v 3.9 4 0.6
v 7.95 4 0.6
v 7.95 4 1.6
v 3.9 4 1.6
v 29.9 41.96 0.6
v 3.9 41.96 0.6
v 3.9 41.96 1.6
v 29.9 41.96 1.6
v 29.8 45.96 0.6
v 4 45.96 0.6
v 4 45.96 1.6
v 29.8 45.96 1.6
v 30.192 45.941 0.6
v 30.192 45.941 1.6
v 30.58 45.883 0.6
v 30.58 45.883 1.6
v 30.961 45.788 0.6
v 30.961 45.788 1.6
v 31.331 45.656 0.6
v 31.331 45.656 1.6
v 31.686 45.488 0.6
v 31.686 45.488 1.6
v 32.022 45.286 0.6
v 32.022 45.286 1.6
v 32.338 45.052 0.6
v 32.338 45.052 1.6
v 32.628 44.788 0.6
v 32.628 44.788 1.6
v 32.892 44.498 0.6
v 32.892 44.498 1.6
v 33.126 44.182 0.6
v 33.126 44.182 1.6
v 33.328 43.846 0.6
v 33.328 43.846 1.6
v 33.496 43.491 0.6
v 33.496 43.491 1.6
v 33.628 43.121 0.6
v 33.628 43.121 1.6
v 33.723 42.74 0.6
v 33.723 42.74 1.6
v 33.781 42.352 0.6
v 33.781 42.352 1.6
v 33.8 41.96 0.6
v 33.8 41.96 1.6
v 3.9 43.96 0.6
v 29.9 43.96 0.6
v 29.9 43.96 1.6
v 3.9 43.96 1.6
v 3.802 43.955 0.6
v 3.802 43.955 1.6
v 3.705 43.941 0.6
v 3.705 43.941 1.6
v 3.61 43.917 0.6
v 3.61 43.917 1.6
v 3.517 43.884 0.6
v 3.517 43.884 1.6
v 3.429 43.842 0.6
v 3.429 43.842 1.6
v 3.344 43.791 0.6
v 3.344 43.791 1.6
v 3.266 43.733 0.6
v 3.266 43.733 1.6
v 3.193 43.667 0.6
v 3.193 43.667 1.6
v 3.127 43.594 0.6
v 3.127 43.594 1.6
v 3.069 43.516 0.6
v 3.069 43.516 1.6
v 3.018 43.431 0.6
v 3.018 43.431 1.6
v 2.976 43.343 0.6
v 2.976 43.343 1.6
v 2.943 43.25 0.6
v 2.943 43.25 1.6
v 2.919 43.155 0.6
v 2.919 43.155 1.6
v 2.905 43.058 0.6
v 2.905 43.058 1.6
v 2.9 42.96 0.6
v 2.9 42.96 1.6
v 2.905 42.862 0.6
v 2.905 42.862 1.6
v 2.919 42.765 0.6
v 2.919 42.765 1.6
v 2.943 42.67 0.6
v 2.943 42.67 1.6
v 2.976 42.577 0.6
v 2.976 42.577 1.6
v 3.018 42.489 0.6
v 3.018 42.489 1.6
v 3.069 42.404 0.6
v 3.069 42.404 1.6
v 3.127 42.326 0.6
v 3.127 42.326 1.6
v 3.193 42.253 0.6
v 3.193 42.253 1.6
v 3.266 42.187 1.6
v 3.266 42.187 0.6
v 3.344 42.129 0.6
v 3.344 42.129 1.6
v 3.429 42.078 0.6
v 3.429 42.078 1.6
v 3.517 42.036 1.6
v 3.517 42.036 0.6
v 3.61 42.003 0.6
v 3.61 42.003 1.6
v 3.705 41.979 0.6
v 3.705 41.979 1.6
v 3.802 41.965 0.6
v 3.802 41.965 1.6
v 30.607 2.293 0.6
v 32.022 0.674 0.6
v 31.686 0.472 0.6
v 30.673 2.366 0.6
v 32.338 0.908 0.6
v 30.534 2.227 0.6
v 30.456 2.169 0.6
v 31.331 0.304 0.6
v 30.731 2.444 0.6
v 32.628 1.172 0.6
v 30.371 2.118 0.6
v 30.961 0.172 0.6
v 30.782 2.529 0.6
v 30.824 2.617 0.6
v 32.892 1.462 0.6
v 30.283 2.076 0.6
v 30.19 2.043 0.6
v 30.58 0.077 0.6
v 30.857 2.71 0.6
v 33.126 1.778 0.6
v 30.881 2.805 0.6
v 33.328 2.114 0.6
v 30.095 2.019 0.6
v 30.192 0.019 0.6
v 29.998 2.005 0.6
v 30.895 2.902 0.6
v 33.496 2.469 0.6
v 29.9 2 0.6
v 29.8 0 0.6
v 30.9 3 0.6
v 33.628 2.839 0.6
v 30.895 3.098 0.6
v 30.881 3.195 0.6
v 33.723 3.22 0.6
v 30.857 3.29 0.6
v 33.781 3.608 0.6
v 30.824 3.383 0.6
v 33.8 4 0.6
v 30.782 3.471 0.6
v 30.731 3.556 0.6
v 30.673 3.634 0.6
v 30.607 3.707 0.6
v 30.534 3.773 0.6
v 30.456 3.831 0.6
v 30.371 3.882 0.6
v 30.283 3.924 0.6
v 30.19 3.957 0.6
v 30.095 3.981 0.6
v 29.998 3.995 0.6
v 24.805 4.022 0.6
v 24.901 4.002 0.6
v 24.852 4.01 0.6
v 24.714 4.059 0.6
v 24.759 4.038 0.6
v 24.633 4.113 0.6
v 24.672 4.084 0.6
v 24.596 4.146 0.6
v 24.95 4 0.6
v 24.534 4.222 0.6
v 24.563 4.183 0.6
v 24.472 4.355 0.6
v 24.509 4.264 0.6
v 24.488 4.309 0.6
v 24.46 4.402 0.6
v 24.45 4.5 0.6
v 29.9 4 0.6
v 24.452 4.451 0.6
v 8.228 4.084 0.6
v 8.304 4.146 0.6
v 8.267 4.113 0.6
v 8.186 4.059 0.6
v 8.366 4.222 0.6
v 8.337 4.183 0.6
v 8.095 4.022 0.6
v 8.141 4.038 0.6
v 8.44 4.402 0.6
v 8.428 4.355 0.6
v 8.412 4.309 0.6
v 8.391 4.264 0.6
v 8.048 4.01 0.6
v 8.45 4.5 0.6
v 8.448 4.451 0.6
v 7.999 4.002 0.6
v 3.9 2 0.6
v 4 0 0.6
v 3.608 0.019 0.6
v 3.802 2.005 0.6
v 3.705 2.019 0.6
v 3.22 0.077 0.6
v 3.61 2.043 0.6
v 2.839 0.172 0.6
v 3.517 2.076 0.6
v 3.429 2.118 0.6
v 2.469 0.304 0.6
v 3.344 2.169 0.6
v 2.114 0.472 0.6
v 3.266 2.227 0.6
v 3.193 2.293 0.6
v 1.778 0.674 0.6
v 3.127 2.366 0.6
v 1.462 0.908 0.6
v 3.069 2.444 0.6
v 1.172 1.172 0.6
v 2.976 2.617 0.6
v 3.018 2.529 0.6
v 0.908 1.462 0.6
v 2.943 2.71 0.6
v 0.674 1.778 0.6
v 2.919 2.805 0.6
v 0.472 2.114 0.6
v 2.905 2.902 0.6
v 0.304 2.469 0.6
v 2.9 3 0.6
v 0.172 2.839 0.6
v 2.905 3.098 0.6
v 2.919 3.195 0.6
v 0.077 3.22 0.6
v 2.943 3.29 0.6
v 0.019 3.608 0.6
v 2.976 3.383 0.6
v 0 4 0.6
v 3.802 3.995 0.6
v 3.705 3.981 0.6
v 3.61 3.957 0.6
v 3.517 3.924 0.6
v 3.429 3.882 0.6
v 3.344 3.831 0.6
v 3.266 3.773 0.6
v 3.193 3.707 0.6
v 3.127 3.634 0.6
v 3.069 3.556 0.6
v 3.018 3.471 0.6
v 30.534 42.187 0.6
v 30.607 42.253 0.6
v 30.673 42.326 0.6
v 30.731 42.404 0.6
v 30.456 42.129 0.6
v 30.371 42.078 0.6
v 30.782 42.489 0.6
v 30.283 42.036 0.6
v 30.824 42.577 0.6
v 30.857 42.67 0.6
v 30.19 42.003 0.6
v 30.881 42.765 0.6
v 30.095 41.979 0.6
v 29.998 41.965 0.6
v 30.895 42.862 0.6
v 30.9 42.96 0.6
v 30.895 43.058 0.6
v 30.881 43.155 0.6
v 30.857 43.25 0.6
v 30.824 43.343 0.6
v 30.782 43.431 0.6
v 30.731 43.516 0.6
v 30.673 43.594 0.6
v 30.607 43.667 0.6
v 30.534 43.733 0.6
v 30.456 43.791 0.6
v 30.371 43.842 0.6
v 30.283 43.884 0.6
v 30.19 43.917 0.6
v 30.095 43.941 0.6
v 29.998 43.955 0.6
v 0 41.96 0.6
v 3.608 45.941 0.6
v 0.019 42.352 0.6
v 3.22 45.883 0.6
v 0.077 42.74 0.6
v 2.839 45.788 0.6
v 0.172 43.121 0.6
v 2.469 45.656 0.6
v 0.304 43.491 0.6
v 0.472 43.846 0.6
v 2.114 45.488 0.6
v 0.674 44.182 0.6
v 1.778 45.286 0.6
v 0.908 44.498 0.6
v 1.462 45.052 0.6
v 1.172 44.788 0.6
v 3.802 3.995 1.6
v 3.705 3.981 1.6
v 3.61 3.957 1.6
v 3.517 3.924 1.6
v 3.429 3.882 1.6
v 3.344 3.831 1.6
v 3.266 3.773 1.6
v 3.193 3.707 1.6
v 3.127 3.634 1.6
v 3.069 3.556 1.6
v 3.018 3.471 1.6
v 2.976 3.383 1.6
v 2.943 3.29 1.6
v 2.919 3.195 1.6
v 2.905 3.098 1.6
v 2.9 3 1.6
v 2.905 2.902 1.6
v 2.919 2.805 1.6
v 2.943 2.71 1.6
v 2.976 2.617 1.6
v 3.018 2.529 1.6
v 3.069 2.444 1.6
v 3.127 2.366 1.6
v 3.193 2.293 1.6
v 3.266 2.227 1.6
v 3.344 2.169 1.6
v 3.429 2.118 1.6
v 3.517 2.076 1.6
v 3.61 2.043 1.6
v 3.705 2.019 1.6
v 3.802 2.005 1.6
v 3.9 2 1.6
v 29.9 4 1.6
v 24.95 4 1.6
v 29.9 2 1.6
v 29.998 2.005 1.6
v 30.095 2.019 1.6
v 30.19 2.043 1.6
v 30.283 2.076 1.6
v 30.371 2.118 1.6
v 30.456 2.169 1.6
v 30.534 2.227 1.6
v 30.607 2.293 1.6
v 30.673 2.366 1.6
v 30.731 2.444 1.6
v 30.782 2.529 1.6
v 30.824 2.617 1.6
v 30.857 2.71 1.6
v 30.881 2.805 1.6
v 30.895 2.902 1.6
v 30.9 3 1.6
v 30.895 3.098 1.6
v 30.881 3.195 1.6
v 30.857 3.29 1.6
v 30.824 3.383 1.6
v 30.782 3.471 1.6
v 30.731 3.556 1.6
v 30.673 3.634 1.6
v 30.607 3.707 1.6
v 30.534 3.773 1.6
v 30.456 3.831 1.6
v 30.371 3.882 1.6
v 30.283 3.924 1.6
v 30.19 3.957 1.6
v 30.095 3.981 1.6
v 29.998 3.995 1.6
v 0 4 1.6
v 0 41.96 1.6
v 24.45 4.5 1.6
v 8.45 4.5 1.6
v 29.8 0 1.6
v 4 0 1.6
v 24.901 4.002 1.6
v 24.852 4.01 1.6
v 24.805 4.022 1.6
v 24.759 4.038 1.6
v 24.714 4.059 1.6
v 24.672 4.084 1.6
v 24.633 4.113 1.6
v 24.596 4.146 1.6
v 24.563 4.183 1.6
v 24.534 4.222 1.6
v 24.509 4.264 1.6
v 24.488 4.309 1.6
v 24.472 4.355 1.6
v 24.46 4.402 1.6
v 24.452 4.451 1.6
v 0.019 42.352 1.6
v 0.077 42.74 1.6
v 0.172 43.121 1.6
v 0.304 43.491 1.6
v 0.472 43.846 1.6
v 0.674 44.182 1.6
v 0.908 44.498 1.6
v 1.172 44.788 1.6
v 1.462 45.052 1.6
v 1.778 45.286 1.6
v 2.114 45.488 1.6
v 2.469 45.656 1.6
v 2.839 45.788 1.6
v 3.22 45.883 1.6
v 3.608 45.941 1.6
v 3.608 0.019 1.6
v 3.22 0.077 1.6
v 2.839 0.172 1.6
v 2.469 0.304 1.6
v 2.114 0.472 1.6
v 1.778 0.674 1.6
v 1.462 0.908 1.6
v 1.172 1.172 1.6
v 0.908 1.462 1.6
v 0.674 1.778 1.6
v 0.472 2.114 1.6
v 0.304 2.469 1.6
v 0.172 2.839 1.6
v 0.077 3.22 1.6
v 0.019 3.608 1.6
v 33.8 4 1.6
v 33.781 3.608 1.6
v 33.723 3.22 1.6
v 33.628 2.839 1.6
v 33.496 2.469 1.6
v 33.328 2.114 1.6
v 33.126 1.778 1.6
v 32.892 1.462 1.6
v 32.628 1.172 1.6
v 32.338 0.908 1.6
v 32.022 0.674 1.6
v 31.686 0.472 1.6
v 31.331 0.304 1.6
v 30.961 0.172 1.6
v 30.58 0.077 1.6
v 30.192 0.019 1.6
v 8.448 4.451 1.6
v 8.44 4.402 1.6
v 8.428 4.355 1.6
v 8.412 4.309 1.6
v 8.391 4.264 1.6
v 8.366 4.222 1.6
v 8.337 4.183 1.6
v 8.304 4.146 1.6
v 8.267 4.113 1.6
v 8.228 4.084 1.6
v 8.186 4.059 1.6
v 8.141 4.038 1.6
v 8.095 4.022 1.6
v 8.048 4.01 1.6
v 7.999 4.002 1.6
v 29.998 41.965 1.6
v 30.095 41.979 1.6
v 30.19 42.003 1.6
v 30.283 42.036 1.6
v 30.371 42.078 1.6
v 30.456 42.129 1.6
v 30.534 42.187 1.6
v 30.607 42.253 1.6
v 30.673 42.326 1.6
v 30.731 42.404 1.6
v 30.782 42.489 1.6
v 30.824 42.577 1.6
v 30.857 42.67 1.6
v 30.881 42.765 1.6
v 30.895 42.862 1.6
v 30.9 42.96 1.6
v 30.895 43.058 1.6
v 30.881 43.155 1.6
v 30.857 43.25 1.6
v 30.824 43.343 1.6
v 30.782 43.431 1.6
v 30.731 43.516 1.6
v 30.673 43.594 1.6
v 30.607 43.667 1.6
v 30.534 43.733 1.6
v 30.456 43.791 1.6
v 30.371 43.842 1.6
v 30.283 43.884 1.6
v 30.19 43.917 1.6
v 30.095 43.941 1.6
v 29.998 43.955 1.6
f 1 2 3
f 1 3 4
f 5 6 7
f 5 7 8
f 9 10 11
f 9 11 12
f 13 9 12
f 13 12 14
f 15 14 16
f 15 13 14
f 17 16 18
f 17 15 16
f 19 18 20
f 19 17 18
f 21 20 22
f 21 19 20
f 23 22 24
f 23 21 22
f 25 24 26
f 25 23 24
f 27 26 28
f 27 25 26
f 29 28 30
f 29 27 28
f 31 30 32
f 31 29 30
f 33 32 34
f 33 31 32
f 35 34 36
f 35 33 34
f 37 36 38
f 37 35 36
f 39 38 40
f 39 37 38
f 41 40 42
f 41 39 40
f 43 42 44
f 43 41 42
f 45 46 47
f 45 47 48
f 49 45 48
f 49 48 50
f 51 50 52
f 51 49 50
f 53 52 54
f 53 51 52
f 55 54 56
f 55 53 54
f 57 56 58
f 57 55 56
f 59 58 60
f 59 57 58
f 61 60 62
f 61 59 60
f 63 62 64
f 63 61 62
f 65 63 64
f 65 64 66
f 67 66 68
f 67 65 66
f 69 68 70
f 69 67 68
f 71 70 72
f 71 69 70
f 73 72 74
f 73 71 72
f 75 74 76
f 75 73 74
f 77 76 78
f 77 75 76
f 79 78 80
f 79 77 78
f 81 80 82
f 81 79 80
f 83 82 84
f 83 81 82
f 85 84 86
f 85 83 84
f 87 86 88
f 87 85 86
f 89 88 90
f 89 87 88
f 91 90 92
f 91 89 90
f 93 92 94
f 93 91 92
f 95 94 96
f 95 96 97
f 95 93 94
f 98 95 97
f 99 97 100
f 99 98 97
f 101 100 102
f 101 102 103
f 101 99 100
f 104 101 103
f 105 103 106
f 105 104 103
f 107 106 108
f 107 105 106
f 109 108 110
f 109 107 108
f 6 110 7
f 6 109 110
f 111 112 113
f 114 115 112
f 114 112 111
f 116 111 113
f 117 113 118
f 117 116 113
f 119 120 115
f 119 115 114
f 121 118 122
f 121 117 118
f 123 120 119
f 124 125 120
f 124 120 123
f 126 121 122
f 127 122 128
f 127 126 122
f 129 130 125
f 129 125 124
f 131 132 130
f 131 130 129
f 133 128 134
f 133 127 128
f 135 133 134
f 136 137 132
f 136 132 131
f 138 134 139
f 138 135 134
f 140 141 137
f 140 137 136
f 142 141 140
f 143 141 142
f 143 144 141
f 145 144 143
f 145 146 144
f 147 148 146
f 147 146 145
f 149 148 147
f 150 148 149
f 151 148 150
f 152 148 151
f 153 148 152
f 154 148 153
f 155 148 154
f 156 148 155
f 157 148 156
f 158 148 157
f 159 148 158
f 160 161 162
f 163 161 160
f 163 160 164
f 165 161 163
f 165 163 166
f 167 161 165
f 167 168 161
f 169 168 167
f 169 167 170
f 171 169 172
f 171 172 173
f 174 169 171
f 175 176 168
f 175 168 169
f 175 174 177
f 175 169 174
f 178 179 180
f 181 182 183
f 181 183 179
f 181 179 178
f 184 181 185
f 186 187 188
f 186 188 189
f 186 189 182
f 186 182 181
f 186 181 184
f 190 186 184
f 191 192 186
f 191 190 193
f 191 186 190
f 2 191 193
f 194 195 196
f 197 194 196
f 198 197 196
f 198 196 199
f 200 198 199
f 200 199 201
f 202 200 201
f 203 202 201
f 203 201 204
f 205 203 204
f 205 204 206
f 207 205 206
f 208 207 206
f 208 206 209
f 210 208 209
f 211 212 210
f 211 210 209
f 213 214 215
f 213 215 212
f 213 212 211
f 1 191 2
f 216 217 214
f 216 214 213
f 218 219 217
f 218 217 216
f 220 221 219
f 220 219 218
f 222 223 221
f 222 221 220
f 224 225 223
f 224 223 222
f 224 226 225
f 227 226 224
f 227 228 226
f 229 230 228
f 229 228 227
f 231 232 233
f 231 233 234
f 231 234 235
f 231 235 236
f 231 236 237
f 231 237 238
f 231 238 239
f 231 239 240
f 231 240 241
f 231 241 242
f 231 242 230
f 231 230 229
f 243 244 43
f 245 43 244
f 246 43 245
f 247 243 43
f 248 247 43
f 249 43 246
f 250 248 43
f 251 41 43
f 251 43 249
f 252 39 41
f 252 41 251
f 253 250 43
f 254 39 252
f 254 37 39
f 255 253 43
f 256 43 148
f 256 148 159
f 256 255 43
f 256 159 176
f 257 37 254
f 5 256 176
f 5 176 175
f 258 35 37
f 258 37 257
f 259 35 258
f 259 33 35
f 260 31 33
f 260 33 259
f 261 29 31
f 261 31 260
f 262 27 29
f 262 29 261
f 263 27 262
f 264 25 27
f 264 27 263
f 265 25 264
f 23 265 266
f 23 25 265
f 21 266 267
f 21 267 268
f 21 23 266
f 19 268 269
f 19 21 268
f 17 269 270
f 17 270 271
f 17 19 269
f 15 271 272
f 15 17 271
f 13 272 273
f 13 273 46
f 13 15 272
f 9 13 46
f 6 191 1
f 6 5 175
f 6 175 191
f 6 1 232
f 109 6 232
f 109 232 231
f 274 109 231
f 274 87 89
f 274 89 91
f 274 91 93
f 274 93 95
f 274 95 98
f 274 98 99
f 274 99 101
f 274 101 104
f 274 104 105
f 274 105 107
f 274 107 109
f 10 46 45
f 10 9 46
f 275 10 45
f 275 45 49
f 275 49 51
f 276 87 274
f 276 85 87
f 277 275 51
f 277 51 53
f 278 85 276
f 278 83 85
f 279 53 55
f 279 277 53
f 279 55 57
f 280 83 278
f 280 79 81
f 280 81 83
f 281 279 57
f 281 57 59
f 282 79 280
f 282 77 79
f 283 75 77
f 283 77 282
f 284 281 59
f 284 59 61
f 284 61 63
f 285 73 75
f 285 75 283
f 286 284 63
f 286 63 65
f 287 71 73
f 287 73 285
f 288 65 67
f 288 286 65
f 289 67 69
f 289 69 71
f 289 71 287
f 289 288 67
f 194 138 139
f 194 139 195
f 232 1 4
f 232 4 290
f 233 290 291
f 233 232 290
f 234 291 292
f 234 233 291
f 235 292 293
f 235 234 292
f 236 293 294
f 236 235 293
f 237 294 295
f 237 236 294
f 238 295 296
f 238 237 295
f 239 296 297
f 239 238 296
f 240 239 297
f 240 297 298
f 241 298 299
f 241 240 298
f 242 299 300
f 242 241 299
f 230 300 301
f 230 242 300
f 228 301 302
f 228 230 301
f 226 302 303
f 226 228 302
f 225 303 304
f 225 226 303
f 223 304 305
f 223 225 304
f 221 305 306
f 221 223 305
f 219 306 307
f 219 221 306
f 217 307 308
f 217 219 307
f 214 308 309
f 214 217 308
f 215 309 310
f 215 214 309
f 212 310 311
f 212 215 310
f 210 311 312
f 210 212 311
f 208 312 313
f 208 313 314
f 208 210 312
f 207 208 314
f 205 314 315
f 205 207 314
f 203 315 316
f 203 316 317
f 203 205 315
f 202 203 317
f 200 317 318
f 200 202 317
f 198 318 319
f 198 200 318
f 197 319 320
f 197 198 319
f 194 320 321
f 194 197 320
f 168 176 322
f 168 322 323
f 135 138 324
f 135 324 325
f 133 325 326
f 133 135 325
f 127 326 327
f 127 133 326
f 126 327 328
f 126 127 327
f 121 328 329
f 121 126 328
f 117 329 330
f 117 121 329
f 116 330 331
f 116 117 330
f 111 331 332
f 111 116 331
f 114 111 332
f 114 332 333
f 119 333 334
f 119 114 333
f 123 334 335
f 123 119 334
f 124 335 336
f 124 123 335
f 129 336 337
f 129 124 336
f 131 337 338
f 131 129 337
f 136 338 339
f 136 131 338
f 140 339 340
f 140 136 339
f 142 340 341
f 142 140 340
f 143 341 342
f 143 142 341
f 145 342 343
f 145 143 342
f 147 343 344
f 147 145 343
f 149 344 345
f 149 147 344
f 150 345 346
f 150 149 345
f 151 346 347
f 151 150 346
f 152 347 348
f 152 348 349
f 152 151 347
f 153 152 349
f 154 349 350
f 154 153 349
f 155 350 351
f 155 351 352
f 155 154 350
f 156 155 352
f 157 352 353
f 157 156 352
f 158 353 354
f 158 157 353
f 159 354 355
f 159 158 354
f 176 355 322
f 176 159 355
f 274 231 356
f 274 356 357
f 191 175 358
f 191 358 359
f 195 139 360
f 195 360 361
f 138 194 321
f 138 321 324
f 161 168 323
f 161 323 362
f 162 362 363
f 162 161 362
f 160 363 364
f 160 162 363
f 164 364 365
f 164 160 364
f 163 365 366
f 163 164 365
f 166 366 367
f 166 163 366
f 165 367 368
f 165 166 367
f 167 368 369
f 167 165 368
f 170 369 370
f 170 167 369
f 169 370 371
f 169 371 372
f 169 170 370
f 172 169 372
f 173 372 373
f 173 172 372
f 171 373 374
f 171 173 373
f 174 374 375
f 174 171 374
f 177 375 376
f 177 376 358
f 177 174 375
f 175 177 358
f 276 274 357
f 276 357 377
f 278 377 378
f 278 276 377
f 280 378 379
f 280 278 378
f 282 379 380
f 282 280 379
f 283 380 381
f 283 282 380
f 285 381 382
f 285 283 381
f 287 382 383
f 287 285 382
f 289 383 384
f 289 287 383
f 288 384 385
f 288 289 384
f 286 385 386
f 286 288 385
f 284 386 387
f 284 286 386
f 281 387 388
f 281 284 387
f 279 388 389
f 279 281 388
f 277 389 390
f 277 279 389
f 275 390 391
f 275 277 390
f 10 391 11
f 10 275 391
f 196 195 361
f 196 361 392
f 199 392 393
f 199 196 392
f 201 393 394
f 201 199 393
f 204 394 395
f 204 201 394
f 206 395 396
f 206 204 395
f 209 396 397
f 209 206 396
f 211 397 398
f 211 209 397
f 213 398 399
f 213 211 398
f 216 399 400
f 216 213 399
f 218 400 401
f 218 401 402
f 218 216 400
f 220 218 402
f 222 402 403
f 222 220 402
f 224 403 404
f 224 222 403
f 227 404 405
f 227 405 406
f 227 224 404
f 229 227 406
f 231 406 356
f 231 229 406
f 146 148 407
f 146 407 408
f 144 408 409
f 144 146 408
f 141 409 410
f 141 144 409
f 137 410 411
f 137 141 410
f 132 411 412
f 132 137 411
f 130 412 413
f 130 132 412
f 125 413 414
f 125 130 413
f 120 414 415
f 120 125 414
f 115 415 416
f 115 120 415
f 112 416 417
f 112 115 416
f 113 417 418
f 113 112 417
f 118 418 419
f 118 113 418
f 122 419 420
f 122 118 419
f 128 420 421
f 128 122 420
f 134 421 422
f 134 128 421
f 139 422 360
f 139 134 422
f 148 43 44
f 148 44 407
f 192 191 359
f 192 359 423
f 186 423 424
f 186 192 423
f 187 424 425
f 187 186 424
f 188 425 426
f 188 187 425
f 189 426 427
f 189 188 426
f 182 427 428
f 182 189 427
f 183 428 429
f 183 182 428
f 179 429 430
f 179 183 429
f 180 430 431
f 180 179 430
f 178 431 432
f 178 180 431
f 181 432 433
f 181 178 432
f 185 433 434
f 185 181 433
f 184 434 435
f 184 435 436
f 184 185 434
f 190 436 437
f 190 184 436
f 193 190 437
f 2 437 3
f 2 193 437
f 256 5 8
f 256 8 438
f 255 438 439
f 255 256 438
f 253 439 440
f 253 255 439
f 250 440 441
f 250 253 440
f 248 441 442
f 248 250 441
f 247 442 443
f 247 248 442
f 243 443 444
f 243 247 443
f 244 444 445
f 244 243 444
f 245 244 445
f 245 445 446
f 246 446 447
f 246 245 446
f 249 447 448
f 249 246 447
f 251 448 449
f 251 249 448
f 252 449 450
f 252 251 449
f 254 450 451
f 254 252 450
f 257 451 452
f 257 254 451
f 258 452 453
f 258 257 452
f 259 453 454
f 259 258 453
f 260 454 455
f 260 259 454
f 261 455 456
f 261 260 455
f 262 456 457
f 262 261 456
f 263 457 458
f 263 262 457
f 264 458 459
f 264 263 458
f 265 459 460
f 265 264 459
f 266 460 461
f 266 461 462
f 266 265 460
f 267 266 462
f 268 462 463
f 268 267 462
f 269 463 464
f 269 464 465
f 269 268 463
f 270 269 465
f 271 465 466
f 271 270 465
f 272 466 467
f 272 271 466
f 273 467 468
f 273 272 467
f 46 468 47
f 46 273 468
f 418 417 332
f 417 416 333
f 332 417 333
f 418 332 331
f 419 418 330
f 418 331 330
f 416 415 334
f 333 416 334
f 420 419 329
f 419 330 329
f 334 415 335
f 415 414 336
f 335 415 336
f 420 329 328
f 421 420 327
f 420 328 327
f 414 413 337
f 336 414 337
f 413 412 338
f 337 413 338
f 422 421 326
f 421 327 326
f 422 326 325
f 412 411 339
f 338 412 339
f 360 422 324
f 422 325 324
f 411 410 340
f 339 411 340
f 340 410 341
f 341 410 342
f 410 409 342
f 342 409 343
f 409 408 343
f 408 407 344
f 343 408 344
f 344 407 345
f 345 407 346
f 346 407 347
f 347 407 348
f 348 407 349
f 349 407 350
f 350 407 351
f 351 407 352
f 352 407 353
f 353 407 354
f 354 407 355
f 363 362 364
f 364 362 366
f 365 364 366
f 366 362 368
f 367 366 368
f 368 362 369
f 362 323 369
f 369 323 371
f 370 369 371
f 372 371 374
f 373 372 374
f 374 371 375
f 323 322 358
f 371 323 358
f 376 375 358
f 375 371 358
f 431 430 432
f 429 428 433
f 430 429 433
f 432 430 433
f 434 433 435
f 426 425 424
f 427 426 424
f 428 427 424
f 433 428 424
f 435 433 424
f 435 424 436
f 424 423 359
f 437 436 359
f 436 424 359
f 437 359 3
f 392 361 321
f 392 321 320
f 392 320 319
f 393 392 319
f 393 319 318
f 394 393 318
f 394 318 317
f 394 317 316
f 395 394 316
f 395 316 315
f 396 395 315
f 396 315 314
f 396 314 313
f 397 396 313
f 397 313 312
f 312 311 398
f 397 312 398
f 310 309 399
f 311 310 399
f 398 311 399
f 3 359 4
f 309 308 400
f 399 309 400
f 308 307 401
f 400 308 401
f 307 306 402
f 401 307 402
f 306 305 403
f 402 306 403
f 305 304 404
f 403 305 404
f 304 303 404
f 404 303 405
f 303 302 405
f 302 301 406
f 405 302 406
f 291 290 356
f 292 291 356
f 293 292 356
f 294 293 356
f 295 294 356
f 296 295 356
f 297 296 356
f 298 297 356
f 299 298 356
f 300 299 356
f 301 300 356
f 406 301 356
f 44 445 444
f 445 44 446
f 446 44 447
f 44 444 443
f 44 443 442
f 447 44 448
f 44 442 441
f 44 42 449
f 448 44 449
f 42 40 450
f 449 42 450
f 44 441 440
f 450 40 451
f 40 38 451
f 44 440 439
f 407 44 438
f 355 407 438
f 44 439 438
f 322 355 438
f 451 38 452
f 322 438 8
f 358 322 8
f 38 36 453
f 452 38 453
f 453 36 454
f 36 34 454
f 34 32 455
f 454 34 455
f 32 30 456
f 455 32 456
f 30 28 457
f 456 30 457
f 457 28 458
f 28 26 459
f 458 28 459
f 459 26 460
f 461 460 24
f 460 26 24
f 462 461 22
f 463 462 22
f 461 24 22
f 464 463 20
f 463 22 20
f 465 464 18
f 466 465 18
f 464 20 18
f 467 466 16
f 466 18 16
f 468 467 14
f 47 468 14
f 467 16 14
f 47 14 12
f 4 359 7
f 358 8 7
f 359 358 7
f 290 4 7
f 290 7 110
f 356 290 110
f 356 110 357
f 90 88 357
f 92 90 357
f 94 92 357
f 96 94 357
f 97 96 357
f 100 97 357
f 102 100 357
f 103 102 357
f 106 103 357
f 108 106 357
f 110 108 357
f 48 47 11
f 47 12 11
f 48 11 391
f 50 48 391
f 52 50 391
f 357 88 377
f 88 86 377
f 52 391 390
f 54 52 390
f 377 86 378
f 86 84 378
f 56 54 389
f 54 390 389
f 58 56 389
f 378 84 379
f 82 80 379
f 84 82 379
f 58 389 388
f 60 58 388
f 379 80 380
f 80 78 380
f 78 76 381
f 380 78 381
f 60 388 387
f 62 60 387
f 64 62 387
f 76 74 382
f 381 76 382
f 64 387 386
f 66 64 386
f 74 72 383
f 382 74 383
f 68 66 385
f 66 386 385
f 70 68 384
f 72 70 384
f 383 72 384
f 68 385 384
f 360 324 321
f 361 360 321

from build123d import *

# Parameters (mm, degrees)
BOSS_EXTRUDE1_DEPTH = 1


with BuildPart() as part:
    # Sketch1 → Boss-Extrude1 (new body)
    with BuildSketch(Plane(origin=(0, 0, 0.6), x_dir=(-1, 0, 0), z_dir=(0, 0, -1))):
        with BuildLine():
            Line((-4, 45.96), (-29.8, 45.96))
            ThreePointArc((-29.8, 45.96), (-32.628427125, 44.788427125), (-33.8, 41.96))
            Line((-33.8, 41.96), (-33.8, 4))
            ThreePointArc((-33.8, 4), (-32.628427125, 1.171572875), (-29.8, 0))
            Line((-29.8, 0), (-4, 0))
            ThreePointArc((-4, 0), (-1.171572875, 1.171572875), (0, 4))
            Line((0, 4), (0, 41.96))
            ThreePointArc((0, 41.96), (-1.171572875, 44.788427125), (-4, 45.96))
        make_face()
        with BuildLine():
            Line((-7.95, 4), (-3.9, 4))
            ThreePointArc((-3.9, 4), (-2.9, 3), (-3.9, 2))
            Line((-3.9, 2), (-29.9, 2))
            ThreePointArc((-29.9, 2), (-30.9, 3), (-29.9, 4))
            Line((-29.9, 4), (-24.95, 4))
            ThreePointArc((-24.95, 4), (-24.596446609, 4.146446609), (-24.45, 4.5))
            Line((-24.45, 4.5), (-8.45, 4.5))
            ThreePointArc((-8.45, 4.5), (-8.303553391, 4.146446609), (-7.95, 4))
        make_face(mode=Mode.SUBTRACT)
        with BuildLine():
            Line((-3.9, 41.96), (-29.9, 41.96))
            ThreePointArc((-29.9, 41.96), (-30.9, 42.96), (-29.9, 43.96))
            Line((-29.9, 43.96), (-3.9, 43.96))
            ThreePointArc((-3.9, 43.96), (-2.9, 42.96), (-3.9, 41.96))
        make_face(mode=Mode.SUBTRACT)
    extrude(amount=-BOSS_EXTRUDE1_DEPTH)


solid = part.part
